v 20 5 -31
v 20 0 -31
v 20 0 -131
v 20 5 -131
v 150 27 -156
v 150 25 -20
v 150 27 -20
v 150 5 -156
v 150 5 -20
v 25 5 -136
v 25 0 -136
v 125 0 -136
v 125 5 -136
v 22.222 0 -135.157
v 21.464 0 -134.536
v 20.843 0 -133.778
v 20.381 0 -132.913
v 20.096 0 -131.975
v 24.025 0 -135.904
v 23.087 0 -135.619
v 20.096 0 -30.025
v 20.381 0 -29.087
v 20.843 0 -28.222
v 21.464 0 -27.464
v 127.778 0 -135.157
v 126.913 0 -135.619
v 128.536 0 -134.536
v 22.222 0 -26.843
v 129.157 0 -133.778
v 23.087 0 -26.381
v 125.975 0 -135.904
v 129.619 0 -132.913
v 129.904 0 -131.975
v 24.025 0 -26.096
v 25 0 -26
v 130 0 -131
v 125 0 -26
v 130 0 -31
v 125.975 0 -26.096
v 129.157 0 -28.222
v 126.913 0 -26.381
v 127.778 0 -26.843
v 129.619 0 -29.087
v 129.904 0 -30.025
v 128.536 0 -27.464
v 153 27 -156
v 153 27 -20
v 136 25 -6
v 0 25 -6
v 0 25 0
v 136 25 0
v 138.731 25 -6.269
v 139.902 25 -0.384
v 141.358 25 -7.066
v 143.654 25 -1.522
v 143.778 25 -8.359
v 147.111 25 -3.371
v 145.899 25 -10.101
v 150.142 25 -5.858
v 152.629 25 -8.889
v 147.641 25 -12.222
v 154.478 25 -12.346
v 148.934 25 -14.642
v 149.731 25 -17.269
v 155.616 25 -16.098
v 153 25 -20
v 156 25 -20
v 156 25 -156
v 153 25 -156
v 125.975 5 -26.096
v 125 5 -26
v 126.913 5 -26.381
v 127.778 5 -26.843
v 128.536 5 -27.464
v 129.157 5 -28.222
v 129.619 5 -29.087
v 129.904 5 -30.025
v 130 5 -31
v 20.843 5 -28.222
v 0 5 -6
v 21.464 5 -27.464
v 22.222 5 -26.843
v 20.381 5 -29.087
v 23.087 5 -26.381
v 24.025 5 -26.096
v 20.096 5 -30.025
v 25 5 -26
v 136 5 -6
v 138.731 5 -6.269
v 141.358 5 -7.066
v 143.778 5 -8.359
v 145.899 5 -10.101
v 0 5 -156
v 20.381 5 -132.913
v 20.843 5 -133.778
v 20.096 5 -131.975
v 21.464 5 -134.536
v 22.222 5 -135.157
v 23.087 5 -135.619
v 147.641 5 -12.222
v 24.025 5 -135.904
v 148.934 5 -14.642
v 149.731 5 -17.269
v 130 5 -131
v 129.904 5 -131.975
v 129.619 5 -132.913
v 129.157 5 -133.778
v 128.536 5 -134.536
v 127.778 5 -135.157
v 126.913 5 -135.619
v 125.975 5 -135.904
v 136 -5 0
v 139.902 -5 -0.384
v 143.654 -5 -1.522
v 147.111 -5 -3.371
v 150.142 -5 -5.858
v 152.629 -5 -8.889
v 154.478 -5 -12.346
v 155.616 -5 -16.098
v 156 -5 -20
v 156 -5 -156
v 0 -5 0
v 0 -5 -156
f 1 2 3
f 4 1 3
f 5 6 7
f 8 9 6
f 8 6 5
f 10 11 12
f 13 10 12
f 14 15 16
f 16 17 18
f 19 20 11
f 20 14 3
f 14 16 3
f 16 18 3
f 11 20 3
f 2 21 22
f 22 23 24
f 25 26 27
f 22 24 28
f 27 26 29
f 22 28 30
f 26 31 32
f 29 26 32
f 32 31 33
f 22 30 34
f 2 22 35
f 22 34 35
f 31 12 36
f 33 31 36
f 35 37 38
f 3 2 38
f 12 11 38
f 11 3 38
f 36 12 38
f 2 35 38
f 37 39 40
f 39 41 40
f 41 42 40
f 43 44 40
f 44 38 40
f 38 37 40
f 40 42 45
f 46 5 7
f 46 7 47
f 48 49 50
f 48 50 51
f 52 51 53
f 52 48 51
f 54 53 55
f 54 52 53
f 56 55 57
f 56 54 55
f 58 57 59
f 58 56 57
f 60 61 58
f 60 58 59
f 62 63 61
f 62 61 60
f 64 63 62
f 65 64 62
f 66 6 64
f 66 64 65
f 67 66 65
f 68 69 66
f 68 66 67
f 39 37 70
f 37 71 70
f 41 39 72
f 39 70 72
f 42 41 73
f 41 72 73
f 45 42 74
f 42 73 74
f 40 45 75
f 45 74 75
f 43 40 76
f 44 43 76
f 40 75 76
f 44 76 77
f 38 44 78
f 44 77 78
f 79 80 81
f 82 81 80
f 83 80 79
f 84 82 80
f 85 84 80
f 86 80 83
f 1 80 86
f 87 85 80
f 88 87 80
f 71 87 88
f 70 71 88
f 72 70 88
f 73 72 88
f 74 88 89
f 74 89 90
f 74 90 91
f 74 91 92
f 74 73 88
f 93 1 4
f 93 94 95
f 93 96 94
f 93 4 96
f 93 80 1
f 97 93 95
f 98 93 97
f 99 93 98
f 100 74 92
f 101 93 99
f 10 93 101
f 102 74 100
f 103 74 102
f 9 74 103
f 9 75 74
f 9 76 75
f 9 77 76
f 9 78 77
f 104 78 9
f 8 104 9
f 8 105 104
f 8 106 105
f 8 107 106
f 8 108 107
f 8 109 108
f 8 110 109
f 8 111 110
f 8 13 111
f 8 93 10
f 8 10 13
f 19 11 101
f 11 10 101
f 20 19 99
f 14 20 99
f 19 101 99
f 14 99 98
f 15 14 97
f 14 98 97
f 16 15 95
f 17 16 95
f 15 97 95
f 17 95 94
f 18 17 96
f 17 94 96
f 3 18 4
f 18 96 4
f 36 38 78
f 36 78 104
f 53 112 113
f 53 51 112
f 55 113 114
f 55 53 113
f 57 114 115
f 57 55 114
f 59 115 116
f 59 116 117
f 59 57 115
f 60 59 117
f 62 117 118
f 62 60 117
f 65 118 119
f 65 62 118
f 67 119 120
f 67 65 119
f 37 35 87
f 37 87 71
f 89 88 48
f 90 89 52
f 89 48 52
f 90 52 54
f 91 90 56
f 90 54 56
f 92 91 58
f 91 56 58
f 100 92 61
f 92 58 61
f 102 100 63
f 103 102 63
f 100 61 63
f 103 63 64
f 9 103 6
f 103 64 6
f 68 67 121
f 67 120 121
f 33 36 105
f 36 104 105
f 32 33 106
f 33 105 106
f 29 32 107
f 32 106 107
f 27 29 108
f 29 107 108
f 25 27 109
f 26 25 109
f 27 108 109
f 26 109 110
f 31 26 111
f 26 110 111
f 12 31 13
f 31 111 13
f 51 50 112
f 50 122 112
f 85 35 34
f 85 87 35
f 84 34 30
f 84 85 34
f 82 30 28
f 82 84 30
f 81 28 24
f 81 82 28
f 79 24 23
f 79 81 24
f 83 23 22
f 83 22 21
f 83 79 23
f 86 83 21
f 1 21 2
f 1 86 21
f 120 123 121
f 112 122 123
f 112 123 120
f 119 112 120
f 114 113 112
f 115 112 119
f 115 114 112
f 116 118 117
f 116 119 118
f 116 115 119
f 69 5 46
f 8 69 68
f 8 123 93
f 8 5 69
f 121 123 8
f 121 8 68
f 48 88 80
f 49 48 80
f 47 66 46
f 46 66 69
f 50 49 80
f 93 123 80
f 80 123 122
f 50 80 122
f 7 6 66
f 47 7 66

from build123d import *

# Parameters (mm, degrees)
SKIZZE9_W               = 156
SKIZZE9_H               = 156
SKIZZE9_W_2             = 110
SKIZZE9_H_2             = 110
LINEAR_AUSTRAGEN4_DEPTH = 5
VERRUNDUNG5_R           = 5
SKIZZE10_W              = 156
SKIZZE10_H              = 156
LINEAR_AUSTRAGEN5_DEPTH = 5
LINEAR_AUSTRAGEN6_DEPTH = 20
VERRUNDUNG6_R           = 20
VERRUNDUNG7_R           = 14
SKIZZE12_W              = 3
SKIZZE12_H              = 136
LINEAR_AUSTRAGEN7_DEPTH = 2


with BuildPart() as part:
    # Skizze9 → Linear austragen4 (new body)
    with BuildSketch(Plane(origin=(0, 0, 0), x_dir=(1, 0, 0), z_dir=(0, 1, 0))):
        with Locations((78, 78)):
            Rectangle(SKIZZE9_W, SKIZZE9_H)
        with Locations((75, 81)):
            Rectangle(SKIZZE9_W_2, SKIZZE9_H_2, mode=Mode.SUBTRACT)
    extrude(amount=LINEAR_AUSTRAGEN4_DEPTH)

    # Verrundung5
    verrundung5_edges = [part.edges().sort_by_distance(p)[0] for p in [
        (20, 2.5, -136),
        (20, 2.5, -26),
        (130, 2.5, -26),
        (130, 2.5, -136),
    ]]
    fillet(verrundung5_edges, radius=VERRUNDUNG5_R)

    # Skizze10 → Linear austragen5 (add)
    with BuildSketch(Plane.XZ):
        with Locations((78, -78)):
            Rectangle(SKIZZE10_W, SKIZZE10_H)
    extrude(amount=LINEAR_AUSTRAGEN5_DEPTH)

    # Skizze11 → Linear austragen6 (add)
    with BuildSketch(Plane(origin=(0, 5, 0), x_dir=(1, 0, 0), z_dir=(0, 1, 0))):
        Polygon((0, 0), (156, 0), (156, 156), (150, 156), (150, 6), (0, 6), align=None)
    extrude(amount=LINEAR_AUSTRAGEN6_DEPTH)

    # Verrundung6
    verrundung6_edges = [part.edges().sort_by_distance(p)[0] for p in [
        (156, 10, 0),
    ]]
    fillet(verrundung6_edges, radius=VERRUNDUNG6_R)

    # Verrundung7
    verrundung7_edges = [part.edges().sort_by_distance(p)[0] for p in [
        (150, 15, -6),
    ]]
    fillet(verrundung7_edges, radius=VERRUNDUNG7_R)

    # Skizze12 → Linear austragen7 (add)
    with BuildSketch(Plane(origin=(0, 25, 0), x_dir=(1, 0, 0), z_dir=(0, 1, 0))):
        with Locations((151.5, 88)):
            Rectangle(SKIZZE12_W, SKIZZE12_H)
    extrude(amount=LINEAR_AUSTRAGEN7_DEPTH)


solid = part.part
